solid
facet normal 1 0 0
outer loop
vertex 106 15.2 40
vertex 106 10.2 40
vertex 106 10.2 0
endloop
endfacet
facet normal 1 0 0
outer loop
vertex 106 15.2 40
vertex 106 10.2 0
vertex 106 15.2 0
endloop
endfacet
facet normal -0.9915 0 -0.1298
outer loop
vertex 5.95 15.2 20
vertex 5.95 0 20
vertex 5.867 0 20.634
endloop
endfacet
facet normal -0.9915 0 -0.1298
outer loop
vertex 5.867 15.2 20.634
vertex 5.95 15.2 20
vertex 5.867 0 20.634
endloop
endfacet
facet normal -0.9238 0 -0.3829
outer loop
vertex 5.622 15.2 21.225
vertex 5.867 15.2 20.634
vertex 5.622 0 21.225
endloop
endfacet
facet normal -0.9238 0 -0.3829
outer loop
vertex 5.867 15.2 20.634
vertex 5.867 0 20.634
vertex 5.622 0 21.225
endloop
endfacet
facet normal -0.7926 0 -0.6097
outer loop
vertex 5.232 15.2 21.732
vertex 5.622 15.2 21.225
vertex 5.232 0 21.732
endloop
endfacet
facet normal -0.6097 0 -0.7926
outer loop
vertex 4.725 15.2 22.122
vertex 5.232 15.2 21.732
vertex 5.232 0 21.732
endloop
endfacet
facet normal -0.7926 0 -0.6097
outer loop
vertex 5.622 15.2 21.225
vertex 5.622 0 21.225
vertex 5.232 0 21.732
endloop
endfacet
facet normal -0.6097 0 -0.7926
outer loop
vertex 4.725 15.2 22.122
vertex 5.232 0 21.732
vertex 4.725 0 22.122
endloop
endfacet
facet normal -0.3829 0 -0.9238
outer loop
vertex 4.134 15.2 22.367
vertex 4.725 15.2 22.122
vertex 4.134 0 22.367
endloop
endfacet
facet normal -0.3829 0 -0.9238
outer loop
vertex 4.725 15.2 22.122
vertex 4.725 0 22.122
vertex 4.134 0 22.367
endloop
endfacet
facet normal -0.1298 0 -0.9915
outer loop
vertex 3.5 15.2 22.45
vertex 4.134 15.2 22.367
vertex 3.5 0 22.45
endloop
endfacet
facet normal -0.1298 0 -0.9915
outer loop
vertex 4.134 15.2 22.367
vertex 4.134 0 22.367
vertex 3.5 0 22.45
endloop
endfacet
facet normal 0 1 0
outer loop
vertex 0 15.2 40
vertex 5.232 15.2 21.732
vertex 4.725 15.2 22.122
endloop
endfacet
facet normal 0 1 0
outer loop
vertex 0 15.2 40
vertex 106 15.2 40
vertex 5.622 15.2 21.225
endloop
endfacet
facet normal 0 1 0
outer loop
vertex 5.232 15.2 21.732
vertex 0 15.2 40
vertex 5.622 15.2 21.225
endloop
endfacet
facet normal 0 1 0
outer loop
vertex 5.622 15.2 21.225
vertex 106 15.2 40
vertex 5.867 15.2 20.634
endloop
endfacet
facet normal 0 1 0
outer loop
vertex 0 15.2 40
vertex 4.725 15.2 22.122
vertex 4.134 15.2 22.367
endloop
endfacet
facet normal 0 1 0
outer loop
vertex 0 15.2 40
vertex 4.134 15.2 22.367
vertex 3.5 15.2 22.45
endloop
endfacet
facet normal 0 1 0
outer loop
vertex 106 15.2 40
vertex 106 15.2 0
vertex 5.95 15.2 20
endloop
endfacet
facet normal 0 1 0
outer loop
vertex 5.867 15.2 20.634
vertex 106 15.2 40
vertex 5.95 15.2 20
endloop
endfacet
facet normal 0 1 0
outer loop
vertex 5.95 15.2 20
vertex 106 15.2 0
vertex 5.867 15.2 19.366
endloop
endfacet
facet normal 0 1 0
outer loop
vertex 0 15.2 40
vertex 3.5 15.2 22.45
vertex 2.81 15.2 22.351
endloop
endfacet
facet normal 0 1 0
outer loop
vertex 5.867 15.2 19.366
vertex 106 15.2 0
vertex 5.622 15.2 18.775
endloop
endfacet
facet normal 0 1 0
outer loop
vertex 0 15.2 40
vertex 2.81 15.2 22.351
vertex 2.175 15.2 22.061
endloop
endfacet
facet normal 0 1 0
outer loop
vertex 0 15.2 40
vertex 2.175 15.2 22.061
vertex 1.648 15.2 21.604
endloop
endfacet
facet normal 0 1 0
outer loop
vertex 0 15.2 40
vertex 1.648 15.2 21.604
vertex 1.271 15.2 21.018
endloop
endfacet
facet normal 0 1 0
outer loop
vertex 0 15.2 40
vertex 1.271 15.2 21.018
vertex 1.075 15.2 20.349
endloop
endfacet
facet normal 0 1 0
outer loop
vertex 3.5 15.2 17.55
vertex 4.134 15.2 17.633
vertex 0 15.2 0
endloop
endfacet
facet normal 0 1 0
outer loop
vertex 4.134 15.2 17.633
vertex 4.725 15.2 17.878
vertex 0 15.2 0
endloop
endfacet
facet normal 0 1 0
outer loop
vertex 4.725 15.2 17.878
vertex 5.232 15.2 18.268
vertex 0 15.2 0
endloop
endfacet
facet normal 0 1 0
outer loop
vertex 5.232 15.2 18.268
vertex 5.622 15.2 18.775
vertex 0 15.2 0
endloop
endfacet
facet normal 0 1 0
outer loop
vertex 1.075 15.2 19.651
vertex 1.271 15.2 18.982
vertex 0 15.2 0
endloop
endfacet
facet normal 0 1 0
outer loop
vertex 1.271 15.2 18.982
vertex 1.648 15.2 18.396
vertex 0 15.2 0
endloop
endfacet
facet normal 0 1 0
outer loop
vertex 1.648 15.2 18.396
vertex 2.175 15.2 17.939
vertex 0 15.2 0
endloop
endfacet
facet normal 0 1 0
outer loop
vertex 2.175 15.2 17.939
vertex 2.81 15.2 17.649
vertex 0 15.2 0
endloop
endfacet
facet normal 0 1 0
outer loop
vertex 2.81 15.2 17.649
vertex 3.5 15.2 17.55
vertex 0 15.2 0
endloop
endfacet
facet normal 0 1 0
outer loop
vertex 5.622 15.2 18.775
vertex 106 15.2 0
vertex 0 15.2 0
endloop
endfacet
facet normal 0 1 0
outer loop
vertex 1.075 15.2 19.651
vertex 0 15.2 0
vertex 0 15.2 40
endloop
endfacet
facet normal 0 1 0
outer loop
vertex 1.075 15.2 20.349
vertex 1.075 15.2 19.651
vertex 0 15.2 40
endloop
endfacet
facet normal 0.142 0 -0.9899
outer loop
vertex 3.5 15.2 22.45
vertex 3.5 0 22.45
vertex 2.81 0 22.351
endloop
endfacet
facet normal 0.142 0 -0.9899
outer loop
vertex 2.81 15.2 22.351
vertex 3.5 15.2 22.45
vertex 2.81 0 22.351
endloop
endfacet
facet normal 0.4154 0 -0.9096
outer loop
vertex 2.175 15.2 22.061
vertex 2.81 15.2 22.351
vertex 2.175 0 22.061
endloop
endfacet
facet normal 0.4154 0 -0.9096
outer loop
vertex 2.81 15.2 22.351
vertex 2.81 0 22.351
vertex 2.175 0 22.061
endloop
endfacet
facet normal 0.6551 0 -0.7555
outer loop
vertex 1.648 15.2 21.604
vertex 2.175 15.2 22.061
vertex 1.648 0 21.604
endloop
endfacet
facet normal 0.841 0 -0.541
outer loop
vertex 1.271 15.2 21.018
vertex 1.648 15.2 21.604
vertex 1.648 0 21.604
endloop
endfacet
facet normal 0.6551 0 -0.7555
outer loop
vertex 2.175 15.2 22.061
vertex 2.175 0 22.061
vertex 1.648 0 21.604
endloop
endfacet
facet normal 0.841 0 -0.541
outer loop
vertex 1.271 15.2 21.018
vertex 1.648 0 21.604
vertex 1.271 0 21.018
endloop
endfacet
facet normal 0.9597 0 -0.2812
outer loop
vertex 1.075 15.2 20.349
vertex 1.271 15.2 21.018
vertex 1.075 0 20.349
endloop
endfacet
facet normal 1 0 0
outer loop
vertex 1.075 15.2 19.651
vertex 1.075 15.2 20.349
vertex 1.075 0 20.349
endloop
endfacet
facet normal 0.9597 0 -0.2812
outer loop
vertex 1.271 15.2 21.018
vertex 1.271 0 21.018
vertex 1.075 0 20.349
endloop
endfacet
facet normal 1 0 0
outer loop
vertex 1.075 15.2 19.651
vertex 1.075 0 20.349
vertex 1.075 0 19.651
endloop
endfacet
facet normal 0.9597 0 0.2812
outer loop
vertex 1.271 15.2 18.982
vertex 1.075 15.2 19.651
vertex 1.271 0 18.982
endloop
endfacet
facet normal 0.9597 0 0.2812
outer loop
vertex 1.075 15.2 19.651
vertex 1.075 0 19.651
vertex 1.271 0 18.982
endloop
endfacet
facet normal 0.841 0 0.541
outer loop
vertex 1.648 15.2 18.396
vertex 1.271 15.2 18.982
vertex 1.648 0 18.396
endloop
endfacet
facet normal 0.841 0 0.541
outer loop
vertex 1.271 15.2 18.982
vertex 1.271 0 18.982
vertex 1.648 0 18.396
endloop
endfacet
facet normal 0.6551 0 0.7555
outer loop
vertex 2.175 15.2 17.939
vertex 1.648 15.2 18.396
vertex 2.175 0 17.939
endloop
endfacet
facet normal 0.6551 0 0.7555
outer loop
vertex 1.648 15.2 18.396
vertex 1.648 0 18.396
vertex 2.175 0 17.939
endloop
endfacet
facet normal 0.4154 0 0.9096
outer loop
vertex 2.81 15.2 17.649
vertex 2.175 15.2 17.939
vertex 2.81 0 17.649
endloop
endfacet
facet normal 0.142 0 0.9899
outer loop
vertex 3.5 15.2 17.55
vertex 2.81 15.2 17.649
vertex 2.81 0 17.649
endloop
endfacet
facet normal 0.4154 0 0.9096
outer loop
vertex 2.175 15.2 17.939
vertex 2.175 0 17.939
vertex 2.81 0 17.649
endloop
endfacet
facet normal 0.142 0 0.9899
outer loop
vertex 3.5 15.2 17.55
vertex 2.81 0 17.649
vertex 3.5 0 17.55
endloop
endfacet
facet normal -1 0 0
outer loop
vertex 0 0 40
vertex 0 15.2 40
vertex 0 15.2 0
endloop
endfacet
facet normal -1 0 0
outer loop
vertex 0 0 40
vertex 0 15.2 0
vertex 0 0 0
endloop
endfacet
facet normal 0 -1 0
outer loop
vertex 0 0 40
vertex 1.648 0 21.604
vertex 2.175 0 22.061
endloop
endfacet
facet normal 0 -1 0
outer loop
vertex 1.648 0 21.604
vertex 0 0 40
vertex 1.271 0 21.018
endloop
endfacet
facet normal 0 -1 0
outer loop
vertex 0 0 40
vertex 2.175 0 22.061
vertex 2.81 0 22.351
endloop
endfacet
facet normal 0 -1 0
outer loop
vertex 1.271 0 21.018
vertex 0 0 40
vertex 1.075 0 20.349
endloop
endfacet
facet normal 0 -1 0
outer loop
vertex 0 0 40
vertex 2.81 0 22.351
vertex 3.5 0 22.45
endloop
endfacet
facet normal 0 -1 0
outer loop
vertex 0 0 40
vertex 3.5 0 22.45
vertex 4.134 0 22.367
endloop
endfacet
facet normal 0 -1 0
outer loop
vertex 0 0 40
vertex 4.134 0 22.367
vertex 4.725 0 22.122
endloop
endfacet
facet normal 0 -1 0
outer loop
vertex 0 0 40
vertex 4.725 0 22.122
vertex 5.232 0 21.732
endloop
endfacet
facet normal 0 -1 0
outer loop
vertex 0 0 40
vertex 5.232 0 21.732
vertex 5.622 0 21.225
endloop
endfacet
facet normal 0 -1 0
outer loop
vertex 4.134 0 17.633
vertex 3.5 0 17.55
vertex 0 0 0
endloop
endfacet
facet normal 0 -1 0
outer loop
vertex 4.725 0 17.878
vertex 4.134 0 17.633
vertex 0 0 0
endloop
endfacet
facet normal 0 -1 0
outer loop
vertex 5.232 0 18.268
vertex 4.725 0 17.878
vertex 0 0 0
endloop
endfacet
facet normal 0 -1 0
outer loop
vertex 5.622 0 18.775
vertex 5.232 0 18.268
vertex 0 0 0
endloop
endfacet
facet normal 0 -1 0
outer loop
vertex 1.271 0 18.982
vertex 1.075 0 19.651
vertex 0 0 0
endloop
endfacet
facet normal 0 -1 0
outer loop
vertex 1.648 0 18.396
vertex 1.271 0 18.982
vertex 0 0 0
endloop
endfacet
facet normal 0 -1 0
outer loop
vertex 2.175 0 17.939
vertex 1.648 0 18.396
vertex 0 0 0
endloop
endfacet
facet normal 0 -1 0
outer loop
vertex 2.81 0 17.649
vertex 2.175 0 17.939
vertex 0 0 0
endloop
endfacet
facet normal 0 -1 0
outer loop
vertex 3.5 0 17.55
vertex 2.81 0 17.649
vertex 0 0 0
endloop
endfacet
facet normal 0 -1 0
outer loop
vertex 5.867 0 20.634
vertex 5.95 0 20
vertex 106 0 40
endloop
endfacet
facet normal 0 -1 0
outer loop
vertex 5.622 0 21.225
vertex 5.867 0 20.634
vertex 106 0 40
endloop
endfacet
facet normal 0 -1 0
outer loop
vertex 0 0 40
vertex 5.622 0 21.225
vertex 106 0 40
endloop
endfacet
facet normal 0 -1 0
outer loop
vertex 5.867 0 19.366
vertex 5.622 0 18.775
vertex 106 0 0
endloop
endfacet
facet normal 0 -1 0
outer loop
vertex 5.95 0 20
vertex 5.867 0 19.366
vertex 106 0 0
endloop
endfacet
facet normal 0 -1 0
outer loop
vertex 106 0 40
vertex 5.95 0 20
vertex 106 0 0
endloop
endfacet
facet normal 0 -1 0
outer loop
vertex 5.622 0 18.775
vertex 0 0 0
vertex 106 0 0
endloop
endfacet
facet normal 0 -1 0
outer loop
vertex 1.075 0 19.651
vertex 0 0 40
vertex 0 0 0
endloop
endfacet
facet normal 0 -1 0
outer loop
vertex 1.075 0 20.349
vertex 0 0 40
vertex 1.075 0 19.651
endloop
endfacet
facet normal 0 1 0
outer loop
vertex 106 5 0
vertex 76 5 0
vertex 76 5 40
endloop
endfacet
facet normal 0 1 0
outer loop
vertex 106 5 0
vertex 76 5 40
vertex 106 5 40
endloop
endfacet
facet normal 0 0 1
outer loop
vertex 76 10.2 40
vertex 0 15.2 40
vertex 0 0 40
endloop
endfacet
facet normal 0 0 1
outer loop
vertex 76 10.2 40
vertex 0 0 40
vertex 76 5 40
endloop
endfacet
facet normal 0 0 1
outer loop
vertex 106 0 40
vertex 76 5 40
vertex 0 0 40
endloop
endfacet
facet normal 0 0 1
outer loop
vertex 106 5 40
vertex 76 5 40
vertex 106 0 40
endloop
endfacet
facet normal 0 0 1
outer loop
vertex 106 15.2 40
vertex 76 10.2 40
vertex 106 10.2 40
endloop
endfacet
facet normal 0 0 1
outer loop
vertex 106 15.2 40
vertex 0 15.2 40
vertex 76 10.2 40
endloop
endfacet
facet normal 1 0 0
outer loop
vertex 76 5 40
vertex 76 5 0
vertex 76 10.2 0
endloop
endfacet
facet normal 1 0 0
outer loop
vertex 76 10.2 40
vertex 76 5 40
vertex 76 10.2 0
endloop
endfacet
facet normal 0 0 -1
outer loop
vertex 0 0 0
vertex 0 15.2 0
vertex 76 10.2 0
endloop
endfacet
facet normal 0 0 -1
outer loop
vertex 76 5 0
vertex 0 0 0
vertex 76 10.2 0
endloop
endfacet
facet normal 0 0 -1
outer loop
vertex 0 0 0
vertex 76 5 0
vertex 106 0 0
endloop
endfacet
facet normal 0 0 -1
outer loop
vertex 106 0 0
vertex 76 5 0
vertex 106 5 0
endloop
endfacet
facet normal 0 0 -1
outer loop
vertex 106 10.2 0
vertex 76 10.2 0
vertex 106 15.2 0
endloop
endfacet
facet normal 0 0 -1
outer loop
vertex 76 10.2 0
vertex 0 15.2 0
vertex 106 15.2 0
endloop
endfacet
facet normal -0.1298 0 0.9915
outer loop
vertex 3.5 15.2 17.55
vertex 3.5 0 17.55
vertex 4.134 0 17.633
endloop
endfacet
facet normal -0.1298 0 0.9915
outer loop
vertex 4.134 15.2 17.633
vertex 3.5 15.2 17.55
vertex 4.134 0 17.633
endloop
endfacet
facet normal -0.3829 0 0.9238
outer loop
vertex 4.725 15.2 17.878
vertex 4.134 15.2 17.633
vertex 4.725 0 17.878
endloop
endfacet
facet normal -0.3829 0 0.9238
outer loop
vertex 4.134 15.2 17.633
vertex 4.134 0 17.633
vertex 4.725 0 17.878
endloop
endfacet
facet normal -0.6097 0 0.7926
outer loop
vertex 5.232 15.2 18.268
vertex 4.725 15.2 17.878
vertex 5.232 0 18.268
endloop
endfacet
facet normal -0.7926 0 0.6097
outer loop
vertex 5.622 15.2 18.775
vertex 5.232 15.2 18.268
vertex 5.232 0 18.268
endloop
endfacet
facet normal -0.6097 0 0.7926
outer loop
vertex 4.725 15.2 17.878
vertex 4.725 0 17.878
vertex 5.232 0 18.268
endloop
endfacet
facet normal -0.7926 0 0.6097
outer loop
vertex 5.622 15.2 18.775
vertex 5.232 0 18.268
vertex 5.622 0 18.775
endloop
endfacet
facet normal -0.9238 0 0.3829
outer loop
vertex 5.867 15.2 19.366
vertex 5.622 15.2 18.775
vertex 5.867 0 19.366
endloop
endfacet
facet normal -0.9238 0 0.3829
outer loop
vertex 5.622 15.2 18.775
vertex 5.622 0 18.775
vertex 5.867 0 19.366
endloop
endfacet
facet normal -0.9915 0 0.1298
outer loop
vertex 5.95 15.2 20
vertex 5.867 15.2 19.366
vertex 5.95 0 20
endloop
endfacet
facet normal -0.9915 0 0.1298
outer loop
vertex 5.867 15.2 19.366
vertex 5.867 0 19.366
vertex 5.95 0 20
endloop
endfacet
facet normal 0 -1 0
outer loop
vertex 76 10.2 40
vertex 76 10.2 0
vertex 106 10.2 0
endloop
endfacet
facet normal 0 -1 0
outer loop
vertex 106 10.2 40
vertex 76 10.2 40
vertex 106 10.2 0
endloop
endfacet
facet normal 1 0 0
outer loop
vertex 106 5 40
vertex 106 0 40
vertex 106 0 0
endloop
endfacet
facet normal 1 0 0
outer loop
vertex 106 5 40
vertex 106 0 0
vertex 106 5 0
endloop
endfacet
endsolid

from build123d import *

# Parameters (mm, degrees)
F0_W     = 30
F0_H     = 5
F1_DEPTH = 40
F3_DEPTH = 25


with BuildPart() as f1:
    # F0 (on Top) → F1 (new body)
    with BuildSketch(Plane.XY):
        Polygon((0, 15.2), (0, 0), (76, 0), (76, 5), (76, 10.2), (76, 15.2), align=None)
        with Locations((91, 12.7)):
            Rectangle(F0_W, F0_H)
        with Locations((91, 2.5)):
            Rectangle(F0_W, F0_H)
    extrude(amount=F1_DEPTH)

    # F2 (on face) → F3 (cut)
    with BuildSketch(Plane.XZ):
        with BuildLine():
            ThreePointArc((5.95, 20), (5.2324116139, 21.7324116139), (3.5, 22.45))
            Line((3.5, 22.45), (3.5, 17.55))
            ThreePointArc((3.5, 17.55), (5.2324116139, 18.2675883861), (5.95, 20))
        make_face()
        with BuildLine():
            Line((3.5, 17.55), (3.5, 22.45))
            ThreePointArc((3.5, 22.45), (1.05, 20), (3.5, 17.55))
        make_face()
    extrude(amount=-F3_DEPTH, mode=Mode.SUBTRACT)


solid = f1.part
